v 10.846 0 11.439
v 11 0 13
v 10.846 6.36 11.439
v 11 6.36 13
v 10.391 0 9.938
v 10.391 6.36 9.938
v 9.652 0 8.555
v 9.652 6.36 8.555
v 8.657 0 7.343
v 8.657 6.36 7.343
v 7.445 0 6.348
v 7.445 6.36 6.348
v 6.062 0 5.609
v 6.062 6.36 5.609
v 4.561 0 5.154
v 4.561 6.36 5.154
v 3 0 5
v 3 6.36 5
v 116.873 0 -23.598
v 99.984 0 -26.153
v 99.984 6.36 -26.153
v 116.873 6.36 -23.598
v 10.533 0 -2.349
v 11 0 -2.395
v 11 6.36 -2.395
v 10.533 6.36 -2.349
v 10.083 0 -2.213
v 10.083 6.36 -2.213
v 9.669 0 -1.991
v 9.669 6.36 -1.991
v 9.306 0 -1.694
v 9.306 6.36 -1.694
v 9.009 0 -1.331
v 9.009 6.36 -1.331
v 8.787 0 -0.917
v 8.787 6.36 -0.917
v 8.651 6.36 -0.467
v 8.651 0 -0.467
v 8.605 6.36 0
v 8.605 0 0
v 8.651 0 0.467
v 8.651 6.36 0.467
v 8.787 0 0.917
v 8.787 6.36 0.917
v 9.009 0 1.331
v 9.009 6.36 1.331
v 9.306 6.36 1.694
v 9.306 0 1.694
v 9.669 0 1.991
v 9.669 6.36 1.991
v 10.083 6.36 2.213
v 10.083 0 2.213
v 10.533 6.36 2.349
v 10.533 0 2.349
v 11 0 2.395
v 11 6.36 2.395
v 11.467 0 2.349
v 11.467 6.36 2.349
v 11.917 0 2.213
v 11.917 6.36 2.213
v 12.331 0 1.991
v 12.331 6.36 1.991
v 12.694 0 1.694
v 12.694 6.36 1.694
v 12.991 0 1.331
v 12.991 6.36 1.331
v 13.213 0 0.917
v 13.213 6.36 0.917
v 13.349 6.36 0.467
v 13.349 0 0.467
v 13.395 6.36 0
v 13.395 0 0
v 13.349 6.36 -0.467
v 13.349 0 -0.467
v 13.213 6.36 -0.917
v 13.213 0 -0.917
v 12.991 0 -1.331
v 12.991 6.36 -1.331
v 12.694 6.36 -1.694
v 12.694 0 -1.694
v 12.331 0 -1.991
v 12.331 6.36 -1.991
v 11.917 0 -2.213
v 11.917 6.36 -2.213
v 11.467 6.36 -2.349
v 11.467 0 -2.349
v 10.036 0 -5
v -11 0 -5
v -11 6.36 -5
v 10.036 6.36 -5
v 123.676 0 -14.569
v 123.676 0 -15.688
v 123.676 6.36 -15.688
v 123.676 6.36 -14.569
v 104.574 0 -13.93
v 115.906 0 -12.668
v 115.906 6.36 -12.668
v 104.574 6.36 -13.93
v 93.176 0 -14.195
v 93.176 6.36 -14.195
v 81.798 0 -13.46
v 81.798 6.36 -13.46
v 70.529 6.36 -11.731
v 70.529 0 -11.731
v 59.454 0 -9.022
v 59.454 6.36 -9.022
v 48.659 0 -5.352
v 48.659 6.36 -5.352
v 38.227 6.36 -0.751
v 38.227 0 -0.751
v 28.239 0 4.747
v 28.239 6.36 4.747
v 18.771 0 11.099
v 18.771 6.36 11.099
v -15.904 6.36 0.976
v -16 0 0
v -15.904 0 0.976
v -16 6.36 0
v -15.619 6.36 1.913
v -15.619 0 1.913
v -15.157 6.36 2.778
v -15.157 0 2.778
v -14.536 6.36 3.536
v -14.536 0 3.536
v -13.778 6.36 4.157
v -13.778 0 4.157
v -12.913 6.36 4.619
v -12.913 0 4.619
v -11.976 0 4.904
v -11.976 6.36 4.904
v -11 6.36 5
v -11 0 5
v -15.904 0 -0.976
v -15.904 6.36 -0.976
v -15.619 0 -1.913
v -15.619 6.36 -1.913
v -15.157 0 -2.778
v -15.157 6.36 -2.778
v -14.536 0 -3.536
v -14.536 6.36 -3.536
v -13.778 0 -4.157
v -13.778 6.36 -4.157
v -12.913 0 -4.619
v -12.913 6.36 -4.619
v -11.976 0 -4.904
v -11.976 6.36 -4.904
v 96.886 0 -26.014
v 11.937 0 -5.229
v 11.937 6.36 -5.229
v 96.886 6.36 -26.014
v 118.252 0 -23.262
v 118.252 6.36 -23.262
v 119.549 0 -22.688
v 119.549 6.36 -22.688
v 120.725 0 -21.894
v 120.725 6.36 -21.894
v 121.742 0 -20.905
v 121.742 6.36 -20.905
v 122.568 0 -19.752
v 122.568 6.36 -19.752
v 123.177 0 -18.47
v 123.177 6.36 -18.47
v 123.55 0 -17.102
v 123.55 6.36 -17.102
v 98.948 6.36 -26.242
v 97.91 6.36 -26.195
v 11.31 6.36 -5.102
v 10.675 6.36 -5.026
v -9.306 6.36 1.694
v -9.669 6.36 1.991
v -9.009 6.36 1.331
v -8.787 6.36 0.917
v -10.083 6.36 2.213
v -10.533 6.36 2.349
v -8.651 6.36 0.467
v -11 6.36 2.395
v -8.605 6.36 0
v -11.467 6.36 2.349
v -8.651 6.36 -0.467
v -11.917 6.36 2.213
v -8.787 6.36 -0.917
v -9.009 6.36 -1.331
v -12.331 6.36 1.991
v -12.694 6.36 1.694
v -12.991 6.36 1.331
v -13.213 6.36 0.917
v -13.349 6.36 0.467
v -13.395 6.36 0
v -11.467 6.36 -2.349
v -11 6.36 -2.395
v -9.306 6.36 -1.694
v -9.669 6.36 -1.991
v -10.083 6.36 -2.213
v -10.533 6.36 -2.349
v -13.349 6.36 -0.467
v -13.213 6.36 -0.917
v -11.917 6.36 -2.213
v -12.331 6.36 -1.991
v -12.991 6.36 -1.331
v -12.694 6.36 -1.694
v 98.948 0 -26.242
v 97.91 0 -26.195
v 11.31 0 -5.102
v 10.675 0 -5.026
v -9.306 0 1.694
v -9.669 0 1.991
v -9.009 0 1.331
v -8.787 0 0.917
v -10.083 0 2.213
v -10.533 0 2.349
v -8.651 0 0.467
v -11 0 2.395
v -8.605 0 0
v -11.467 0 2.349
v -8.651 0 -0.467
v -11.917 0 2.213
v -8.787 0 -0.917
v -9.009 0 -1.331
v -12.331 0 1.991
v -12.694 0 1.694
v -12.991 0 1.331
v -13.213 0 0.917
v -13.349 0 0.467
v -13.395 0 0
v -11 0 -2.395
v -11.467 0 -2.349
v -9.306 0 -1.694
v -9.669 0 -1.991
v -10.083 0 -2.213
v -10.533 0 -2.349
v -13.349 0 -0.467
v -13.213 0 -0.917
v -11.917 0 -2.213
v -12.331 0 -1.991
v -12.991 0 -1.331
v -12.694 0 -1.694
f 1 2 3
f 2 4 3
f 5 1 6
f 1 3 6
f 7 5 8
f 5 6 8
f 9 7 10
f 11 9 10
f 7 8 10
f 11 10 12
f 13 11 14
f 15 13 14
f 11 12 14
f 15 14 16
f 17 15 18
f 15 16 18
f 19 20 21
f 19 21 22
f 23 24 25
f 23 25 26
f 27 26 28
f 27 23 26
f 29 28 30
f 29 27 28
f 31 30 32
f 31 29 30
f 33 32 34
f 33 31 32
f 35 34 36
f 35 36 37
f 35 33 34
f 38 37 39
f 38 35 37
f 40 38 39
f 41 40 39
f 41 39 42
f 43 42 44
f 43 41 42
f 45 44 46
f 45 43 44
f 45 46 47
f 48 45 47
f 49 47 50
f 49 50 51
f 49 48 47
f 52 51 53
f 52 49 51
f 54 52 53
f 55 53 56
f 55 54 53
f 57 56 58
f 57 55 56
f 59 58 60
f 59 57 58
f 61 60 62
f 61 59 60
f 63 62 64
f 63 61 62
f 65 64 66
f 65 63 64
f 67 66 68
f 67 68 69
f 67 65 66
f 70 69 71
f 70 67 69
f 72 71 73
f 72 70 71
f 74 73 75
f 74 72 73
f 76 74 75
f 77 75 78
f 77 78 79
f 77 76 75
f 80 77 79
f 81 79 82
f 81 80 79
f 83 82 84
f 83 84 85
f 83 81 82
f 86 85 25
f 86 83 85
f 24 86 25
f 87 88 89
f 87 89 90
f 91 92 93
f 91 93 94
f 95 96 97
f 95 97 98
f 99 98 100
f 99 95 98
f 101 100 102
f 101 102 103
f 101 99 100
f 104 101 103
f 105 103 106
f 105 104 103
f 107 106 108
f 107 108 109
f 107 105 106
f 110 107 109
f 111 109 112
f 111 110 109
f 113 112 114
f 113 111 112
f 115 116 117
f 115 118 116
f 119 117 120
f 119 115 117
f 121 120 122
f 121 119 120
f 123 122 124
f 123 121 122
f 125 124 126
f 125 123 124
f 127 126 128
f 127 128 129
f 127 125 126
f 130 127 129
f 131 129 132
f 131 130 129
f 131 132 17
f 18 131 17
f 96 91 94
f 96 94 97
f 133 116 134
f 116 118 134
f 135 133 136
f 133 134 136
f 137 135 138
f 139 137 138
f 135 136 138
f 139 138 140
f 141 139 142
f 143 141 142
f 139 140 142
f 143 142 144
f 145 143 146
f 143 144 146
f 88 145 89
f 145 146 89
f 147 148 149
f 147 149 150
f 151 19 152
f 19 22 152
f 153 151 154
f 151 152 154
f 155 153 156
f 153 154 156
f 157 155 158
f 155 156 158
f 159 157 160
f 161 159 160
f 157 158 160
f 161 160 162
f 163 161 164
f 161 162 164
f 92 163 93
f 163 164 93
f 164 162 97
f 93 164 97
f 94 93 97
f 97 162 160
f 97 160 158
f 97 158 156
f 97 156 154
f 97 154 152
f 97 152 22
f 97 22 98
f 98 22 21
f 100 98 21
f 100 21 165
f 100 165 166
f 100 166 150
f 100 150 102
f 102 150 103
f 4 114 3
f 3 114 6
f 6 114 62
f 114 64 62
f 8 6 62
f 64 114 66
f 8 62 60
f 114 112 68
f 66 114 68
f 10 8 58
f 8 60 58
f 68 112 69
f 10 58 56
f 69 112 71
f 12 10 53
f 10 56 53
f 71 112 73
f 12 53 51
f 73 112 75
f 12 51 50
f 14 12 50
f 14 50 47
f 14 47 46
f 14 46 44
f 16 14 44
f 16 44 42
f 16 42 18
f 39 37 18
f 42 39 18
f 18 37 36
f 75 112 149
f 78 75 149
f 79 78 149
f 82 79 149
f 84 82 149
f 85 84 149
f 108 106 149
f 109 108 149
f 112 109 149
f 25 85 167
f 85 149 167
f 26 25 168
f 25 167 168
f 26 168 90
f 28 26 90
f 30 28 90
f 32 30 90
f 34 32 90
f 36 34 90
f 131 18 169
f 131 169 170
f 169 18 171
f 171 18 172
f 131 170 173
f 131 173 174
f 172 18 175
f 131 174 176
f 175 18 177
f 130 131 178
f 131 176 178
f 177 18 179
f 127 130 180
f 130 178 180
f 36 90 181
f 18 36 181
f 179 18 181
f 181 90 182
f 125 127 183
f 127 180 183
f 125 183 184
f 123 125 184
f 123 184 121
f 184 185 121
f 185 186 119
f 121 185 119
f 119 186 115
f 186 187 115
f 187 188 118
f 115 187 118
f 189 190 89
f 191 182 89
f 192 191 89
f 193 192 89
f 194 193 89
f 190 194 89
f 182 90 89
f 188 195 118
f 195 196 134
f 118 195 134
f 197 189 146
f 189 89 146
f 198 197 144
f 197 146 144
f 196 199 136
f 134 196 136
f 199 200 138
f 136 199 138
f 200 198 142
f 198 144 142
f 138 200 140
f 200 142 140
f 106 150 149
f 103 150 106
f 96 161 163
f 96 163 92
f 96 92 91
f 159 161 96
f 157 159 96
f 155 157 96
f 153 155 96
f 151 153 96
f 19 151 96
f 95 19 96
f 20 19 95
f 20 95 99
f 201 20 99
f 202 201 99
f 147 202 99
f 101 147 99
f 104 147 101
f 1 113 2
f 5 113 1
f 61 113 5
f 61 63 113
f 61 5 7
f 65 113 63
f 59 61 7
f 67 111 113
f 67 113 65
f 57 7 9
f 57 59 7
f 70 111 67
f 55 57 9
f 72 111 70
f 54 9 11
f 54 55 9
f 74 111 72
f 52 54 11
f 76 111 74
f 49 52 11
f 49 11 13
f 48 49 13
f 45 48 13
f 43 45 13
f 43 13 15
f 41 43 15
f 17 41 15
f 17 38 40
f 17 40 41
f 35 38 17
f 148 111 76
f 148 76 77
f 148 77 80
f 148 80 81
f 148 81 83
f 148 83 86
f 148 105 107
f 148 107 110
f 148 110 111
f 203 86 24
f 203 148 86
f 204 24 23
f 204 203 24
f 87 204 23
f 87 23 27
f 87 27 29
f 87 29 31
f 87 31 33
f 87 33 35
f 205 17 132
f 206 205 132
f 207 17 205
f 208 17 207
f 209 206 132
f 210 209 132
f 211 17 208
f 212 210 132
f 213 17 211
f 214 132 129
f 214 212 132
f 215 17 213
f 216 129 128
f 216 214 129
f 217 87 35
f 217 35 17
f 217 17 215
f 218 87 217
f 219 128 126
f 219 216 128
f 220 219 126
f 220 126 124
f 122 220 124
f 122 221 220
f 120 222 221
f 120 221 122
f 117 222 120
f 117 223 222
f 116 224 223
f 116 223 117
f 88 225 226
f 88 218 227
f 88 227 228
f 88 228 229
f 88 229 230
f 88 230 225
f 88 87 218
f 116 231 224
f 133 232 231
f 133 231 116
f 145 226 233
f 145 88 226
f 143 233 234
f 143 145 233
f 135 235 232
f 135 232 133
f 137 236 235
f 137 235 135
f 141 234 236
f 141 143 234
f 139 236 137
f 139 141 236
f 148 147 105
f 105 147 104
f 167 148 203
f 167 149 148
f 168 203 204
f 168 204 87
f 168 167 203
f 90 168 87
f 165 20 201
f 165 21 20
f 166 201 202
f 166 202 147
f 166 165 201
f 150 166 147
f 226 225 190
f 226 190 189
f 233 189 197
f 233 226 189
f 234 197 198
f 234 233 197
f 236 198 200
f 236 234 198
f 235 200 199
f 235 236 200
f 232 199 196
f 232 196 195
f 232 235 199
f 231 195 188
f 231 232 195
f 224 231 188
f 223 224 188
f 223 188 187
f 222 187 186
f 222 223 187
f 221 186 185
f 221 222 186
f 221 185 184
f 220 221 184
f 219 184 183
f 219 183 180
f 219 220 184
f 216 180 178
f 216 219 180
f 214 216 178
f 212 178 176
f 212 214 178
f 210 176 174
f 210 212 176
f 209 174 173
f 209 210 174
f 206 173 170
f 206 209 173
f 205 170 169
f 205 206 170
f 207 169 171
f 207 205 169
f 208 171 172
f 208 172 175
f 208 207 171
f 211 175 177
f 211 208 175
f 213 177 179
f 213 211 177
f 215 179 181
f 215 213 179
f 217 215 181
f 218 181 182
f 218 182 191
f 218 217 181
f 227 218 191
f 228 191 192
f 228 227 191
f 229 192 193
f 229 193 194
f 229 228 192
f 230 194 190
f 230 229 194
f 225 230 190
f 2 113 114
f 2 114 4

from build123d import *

# Parameters (mm, degrees)
SKETCH_1_W          = 32
SKETCH_1_H          = 10
SKETCH_1_R          = 2.395
EXTRUDE_2_DEPTH     = 6.36
FILLET_4_R          = 5
EXTRUDE_3_DEPTH     = 6.36
FILLET_5_R          = 8
FILLET_6_R          = 8
SKETCH_3_R          = 130
CUT_EXTRUDE_2_DEPTH = 6.36


with BuildPart() as part:
    # 草图1 → 凸台-拉伸2 (new body)
    with BuildSketch(Plane(origin=(0, 0, 0), x_dir=(1, 0, 0), z_dir=(0, 1, 0))):
        Rectangle(SKETCH_1_W, SKETCH_1_H)
        with Locations(Location((11, 0, 0), (0, 0, 90))):
            Circle(SKETCH_1_R, mode=Mode.SUBTRACT)
        with Locations(Location((-11, 0, 0), (0, 0, 90))):
            Circle(SKETCH_1_R, mode=Mode.SUBTRACT)
    extrude(amount=EXTRUDE_2_DEPTH)

    # 圆角4
    fillet_4_edges = [part.edges().sort_by_distance(p)[0] for p in [
        (-16, 3.18, 5),
        (-16, 3.18, -5),
    ]]
    fillet(fillet_4_edges, radius=FILLET_4_R - 0.0001)  # a hair under: the kernel refuses the full size

    # 草图2 → 凸台-拉伸3 (add)
    with BuildSketch(Plane(origin=(0, 0, 0), x_dir=(1, 0, 0), z_dir=(0, 1, 0))):
        Polygon((11, 5), (98.421265934, 26.389770044), (123.676298315, 22.569036945), (123.676298315, 14.569036945), (115.905519121, 12.667724053), (18.770779194, -11.098687107), (11, -13), (11, -5), (16, 0), align=None)
    extrude(amount=EXTRUDE_3_DEPTH)

    # 圆角5
    fillet_5_edges = [part.edges().sort_by_distance(p)[0] for p in [
        (123.676298315, 3.18, -22.569036945),
        (11, 3.18, 5),
    ]]
    fillet(fillet_5_edges, radius=FILLET_5_R - 0.0001)  # a hair under: the kernel refuses the full size

    # 圆角6
    fillet_6_edges = [part.edges().sort_by_distance(p)[0] for p in [
        (11, 3.18, -5),
        (98.421265934, 3.18, -26.389770044),
    ]]
    fillet(fillet_6_edges, radius=FILLET_6_R)

    # 草图3 → 切除-拉伸2 (cut)
    with BuildSketch(Plane(origin=(0, 0, 0), x_dir=(1, 0, 0), z_dir=(0, 1, 0))):
        with Locations((95.857842549, -115.777169439)):
            Circle(SKETCH_3_R)
    extrude(amount=CUT_EXTRUDE_2_DEPTH, mode=Mode.SUBTRACT)


solid = part.part
